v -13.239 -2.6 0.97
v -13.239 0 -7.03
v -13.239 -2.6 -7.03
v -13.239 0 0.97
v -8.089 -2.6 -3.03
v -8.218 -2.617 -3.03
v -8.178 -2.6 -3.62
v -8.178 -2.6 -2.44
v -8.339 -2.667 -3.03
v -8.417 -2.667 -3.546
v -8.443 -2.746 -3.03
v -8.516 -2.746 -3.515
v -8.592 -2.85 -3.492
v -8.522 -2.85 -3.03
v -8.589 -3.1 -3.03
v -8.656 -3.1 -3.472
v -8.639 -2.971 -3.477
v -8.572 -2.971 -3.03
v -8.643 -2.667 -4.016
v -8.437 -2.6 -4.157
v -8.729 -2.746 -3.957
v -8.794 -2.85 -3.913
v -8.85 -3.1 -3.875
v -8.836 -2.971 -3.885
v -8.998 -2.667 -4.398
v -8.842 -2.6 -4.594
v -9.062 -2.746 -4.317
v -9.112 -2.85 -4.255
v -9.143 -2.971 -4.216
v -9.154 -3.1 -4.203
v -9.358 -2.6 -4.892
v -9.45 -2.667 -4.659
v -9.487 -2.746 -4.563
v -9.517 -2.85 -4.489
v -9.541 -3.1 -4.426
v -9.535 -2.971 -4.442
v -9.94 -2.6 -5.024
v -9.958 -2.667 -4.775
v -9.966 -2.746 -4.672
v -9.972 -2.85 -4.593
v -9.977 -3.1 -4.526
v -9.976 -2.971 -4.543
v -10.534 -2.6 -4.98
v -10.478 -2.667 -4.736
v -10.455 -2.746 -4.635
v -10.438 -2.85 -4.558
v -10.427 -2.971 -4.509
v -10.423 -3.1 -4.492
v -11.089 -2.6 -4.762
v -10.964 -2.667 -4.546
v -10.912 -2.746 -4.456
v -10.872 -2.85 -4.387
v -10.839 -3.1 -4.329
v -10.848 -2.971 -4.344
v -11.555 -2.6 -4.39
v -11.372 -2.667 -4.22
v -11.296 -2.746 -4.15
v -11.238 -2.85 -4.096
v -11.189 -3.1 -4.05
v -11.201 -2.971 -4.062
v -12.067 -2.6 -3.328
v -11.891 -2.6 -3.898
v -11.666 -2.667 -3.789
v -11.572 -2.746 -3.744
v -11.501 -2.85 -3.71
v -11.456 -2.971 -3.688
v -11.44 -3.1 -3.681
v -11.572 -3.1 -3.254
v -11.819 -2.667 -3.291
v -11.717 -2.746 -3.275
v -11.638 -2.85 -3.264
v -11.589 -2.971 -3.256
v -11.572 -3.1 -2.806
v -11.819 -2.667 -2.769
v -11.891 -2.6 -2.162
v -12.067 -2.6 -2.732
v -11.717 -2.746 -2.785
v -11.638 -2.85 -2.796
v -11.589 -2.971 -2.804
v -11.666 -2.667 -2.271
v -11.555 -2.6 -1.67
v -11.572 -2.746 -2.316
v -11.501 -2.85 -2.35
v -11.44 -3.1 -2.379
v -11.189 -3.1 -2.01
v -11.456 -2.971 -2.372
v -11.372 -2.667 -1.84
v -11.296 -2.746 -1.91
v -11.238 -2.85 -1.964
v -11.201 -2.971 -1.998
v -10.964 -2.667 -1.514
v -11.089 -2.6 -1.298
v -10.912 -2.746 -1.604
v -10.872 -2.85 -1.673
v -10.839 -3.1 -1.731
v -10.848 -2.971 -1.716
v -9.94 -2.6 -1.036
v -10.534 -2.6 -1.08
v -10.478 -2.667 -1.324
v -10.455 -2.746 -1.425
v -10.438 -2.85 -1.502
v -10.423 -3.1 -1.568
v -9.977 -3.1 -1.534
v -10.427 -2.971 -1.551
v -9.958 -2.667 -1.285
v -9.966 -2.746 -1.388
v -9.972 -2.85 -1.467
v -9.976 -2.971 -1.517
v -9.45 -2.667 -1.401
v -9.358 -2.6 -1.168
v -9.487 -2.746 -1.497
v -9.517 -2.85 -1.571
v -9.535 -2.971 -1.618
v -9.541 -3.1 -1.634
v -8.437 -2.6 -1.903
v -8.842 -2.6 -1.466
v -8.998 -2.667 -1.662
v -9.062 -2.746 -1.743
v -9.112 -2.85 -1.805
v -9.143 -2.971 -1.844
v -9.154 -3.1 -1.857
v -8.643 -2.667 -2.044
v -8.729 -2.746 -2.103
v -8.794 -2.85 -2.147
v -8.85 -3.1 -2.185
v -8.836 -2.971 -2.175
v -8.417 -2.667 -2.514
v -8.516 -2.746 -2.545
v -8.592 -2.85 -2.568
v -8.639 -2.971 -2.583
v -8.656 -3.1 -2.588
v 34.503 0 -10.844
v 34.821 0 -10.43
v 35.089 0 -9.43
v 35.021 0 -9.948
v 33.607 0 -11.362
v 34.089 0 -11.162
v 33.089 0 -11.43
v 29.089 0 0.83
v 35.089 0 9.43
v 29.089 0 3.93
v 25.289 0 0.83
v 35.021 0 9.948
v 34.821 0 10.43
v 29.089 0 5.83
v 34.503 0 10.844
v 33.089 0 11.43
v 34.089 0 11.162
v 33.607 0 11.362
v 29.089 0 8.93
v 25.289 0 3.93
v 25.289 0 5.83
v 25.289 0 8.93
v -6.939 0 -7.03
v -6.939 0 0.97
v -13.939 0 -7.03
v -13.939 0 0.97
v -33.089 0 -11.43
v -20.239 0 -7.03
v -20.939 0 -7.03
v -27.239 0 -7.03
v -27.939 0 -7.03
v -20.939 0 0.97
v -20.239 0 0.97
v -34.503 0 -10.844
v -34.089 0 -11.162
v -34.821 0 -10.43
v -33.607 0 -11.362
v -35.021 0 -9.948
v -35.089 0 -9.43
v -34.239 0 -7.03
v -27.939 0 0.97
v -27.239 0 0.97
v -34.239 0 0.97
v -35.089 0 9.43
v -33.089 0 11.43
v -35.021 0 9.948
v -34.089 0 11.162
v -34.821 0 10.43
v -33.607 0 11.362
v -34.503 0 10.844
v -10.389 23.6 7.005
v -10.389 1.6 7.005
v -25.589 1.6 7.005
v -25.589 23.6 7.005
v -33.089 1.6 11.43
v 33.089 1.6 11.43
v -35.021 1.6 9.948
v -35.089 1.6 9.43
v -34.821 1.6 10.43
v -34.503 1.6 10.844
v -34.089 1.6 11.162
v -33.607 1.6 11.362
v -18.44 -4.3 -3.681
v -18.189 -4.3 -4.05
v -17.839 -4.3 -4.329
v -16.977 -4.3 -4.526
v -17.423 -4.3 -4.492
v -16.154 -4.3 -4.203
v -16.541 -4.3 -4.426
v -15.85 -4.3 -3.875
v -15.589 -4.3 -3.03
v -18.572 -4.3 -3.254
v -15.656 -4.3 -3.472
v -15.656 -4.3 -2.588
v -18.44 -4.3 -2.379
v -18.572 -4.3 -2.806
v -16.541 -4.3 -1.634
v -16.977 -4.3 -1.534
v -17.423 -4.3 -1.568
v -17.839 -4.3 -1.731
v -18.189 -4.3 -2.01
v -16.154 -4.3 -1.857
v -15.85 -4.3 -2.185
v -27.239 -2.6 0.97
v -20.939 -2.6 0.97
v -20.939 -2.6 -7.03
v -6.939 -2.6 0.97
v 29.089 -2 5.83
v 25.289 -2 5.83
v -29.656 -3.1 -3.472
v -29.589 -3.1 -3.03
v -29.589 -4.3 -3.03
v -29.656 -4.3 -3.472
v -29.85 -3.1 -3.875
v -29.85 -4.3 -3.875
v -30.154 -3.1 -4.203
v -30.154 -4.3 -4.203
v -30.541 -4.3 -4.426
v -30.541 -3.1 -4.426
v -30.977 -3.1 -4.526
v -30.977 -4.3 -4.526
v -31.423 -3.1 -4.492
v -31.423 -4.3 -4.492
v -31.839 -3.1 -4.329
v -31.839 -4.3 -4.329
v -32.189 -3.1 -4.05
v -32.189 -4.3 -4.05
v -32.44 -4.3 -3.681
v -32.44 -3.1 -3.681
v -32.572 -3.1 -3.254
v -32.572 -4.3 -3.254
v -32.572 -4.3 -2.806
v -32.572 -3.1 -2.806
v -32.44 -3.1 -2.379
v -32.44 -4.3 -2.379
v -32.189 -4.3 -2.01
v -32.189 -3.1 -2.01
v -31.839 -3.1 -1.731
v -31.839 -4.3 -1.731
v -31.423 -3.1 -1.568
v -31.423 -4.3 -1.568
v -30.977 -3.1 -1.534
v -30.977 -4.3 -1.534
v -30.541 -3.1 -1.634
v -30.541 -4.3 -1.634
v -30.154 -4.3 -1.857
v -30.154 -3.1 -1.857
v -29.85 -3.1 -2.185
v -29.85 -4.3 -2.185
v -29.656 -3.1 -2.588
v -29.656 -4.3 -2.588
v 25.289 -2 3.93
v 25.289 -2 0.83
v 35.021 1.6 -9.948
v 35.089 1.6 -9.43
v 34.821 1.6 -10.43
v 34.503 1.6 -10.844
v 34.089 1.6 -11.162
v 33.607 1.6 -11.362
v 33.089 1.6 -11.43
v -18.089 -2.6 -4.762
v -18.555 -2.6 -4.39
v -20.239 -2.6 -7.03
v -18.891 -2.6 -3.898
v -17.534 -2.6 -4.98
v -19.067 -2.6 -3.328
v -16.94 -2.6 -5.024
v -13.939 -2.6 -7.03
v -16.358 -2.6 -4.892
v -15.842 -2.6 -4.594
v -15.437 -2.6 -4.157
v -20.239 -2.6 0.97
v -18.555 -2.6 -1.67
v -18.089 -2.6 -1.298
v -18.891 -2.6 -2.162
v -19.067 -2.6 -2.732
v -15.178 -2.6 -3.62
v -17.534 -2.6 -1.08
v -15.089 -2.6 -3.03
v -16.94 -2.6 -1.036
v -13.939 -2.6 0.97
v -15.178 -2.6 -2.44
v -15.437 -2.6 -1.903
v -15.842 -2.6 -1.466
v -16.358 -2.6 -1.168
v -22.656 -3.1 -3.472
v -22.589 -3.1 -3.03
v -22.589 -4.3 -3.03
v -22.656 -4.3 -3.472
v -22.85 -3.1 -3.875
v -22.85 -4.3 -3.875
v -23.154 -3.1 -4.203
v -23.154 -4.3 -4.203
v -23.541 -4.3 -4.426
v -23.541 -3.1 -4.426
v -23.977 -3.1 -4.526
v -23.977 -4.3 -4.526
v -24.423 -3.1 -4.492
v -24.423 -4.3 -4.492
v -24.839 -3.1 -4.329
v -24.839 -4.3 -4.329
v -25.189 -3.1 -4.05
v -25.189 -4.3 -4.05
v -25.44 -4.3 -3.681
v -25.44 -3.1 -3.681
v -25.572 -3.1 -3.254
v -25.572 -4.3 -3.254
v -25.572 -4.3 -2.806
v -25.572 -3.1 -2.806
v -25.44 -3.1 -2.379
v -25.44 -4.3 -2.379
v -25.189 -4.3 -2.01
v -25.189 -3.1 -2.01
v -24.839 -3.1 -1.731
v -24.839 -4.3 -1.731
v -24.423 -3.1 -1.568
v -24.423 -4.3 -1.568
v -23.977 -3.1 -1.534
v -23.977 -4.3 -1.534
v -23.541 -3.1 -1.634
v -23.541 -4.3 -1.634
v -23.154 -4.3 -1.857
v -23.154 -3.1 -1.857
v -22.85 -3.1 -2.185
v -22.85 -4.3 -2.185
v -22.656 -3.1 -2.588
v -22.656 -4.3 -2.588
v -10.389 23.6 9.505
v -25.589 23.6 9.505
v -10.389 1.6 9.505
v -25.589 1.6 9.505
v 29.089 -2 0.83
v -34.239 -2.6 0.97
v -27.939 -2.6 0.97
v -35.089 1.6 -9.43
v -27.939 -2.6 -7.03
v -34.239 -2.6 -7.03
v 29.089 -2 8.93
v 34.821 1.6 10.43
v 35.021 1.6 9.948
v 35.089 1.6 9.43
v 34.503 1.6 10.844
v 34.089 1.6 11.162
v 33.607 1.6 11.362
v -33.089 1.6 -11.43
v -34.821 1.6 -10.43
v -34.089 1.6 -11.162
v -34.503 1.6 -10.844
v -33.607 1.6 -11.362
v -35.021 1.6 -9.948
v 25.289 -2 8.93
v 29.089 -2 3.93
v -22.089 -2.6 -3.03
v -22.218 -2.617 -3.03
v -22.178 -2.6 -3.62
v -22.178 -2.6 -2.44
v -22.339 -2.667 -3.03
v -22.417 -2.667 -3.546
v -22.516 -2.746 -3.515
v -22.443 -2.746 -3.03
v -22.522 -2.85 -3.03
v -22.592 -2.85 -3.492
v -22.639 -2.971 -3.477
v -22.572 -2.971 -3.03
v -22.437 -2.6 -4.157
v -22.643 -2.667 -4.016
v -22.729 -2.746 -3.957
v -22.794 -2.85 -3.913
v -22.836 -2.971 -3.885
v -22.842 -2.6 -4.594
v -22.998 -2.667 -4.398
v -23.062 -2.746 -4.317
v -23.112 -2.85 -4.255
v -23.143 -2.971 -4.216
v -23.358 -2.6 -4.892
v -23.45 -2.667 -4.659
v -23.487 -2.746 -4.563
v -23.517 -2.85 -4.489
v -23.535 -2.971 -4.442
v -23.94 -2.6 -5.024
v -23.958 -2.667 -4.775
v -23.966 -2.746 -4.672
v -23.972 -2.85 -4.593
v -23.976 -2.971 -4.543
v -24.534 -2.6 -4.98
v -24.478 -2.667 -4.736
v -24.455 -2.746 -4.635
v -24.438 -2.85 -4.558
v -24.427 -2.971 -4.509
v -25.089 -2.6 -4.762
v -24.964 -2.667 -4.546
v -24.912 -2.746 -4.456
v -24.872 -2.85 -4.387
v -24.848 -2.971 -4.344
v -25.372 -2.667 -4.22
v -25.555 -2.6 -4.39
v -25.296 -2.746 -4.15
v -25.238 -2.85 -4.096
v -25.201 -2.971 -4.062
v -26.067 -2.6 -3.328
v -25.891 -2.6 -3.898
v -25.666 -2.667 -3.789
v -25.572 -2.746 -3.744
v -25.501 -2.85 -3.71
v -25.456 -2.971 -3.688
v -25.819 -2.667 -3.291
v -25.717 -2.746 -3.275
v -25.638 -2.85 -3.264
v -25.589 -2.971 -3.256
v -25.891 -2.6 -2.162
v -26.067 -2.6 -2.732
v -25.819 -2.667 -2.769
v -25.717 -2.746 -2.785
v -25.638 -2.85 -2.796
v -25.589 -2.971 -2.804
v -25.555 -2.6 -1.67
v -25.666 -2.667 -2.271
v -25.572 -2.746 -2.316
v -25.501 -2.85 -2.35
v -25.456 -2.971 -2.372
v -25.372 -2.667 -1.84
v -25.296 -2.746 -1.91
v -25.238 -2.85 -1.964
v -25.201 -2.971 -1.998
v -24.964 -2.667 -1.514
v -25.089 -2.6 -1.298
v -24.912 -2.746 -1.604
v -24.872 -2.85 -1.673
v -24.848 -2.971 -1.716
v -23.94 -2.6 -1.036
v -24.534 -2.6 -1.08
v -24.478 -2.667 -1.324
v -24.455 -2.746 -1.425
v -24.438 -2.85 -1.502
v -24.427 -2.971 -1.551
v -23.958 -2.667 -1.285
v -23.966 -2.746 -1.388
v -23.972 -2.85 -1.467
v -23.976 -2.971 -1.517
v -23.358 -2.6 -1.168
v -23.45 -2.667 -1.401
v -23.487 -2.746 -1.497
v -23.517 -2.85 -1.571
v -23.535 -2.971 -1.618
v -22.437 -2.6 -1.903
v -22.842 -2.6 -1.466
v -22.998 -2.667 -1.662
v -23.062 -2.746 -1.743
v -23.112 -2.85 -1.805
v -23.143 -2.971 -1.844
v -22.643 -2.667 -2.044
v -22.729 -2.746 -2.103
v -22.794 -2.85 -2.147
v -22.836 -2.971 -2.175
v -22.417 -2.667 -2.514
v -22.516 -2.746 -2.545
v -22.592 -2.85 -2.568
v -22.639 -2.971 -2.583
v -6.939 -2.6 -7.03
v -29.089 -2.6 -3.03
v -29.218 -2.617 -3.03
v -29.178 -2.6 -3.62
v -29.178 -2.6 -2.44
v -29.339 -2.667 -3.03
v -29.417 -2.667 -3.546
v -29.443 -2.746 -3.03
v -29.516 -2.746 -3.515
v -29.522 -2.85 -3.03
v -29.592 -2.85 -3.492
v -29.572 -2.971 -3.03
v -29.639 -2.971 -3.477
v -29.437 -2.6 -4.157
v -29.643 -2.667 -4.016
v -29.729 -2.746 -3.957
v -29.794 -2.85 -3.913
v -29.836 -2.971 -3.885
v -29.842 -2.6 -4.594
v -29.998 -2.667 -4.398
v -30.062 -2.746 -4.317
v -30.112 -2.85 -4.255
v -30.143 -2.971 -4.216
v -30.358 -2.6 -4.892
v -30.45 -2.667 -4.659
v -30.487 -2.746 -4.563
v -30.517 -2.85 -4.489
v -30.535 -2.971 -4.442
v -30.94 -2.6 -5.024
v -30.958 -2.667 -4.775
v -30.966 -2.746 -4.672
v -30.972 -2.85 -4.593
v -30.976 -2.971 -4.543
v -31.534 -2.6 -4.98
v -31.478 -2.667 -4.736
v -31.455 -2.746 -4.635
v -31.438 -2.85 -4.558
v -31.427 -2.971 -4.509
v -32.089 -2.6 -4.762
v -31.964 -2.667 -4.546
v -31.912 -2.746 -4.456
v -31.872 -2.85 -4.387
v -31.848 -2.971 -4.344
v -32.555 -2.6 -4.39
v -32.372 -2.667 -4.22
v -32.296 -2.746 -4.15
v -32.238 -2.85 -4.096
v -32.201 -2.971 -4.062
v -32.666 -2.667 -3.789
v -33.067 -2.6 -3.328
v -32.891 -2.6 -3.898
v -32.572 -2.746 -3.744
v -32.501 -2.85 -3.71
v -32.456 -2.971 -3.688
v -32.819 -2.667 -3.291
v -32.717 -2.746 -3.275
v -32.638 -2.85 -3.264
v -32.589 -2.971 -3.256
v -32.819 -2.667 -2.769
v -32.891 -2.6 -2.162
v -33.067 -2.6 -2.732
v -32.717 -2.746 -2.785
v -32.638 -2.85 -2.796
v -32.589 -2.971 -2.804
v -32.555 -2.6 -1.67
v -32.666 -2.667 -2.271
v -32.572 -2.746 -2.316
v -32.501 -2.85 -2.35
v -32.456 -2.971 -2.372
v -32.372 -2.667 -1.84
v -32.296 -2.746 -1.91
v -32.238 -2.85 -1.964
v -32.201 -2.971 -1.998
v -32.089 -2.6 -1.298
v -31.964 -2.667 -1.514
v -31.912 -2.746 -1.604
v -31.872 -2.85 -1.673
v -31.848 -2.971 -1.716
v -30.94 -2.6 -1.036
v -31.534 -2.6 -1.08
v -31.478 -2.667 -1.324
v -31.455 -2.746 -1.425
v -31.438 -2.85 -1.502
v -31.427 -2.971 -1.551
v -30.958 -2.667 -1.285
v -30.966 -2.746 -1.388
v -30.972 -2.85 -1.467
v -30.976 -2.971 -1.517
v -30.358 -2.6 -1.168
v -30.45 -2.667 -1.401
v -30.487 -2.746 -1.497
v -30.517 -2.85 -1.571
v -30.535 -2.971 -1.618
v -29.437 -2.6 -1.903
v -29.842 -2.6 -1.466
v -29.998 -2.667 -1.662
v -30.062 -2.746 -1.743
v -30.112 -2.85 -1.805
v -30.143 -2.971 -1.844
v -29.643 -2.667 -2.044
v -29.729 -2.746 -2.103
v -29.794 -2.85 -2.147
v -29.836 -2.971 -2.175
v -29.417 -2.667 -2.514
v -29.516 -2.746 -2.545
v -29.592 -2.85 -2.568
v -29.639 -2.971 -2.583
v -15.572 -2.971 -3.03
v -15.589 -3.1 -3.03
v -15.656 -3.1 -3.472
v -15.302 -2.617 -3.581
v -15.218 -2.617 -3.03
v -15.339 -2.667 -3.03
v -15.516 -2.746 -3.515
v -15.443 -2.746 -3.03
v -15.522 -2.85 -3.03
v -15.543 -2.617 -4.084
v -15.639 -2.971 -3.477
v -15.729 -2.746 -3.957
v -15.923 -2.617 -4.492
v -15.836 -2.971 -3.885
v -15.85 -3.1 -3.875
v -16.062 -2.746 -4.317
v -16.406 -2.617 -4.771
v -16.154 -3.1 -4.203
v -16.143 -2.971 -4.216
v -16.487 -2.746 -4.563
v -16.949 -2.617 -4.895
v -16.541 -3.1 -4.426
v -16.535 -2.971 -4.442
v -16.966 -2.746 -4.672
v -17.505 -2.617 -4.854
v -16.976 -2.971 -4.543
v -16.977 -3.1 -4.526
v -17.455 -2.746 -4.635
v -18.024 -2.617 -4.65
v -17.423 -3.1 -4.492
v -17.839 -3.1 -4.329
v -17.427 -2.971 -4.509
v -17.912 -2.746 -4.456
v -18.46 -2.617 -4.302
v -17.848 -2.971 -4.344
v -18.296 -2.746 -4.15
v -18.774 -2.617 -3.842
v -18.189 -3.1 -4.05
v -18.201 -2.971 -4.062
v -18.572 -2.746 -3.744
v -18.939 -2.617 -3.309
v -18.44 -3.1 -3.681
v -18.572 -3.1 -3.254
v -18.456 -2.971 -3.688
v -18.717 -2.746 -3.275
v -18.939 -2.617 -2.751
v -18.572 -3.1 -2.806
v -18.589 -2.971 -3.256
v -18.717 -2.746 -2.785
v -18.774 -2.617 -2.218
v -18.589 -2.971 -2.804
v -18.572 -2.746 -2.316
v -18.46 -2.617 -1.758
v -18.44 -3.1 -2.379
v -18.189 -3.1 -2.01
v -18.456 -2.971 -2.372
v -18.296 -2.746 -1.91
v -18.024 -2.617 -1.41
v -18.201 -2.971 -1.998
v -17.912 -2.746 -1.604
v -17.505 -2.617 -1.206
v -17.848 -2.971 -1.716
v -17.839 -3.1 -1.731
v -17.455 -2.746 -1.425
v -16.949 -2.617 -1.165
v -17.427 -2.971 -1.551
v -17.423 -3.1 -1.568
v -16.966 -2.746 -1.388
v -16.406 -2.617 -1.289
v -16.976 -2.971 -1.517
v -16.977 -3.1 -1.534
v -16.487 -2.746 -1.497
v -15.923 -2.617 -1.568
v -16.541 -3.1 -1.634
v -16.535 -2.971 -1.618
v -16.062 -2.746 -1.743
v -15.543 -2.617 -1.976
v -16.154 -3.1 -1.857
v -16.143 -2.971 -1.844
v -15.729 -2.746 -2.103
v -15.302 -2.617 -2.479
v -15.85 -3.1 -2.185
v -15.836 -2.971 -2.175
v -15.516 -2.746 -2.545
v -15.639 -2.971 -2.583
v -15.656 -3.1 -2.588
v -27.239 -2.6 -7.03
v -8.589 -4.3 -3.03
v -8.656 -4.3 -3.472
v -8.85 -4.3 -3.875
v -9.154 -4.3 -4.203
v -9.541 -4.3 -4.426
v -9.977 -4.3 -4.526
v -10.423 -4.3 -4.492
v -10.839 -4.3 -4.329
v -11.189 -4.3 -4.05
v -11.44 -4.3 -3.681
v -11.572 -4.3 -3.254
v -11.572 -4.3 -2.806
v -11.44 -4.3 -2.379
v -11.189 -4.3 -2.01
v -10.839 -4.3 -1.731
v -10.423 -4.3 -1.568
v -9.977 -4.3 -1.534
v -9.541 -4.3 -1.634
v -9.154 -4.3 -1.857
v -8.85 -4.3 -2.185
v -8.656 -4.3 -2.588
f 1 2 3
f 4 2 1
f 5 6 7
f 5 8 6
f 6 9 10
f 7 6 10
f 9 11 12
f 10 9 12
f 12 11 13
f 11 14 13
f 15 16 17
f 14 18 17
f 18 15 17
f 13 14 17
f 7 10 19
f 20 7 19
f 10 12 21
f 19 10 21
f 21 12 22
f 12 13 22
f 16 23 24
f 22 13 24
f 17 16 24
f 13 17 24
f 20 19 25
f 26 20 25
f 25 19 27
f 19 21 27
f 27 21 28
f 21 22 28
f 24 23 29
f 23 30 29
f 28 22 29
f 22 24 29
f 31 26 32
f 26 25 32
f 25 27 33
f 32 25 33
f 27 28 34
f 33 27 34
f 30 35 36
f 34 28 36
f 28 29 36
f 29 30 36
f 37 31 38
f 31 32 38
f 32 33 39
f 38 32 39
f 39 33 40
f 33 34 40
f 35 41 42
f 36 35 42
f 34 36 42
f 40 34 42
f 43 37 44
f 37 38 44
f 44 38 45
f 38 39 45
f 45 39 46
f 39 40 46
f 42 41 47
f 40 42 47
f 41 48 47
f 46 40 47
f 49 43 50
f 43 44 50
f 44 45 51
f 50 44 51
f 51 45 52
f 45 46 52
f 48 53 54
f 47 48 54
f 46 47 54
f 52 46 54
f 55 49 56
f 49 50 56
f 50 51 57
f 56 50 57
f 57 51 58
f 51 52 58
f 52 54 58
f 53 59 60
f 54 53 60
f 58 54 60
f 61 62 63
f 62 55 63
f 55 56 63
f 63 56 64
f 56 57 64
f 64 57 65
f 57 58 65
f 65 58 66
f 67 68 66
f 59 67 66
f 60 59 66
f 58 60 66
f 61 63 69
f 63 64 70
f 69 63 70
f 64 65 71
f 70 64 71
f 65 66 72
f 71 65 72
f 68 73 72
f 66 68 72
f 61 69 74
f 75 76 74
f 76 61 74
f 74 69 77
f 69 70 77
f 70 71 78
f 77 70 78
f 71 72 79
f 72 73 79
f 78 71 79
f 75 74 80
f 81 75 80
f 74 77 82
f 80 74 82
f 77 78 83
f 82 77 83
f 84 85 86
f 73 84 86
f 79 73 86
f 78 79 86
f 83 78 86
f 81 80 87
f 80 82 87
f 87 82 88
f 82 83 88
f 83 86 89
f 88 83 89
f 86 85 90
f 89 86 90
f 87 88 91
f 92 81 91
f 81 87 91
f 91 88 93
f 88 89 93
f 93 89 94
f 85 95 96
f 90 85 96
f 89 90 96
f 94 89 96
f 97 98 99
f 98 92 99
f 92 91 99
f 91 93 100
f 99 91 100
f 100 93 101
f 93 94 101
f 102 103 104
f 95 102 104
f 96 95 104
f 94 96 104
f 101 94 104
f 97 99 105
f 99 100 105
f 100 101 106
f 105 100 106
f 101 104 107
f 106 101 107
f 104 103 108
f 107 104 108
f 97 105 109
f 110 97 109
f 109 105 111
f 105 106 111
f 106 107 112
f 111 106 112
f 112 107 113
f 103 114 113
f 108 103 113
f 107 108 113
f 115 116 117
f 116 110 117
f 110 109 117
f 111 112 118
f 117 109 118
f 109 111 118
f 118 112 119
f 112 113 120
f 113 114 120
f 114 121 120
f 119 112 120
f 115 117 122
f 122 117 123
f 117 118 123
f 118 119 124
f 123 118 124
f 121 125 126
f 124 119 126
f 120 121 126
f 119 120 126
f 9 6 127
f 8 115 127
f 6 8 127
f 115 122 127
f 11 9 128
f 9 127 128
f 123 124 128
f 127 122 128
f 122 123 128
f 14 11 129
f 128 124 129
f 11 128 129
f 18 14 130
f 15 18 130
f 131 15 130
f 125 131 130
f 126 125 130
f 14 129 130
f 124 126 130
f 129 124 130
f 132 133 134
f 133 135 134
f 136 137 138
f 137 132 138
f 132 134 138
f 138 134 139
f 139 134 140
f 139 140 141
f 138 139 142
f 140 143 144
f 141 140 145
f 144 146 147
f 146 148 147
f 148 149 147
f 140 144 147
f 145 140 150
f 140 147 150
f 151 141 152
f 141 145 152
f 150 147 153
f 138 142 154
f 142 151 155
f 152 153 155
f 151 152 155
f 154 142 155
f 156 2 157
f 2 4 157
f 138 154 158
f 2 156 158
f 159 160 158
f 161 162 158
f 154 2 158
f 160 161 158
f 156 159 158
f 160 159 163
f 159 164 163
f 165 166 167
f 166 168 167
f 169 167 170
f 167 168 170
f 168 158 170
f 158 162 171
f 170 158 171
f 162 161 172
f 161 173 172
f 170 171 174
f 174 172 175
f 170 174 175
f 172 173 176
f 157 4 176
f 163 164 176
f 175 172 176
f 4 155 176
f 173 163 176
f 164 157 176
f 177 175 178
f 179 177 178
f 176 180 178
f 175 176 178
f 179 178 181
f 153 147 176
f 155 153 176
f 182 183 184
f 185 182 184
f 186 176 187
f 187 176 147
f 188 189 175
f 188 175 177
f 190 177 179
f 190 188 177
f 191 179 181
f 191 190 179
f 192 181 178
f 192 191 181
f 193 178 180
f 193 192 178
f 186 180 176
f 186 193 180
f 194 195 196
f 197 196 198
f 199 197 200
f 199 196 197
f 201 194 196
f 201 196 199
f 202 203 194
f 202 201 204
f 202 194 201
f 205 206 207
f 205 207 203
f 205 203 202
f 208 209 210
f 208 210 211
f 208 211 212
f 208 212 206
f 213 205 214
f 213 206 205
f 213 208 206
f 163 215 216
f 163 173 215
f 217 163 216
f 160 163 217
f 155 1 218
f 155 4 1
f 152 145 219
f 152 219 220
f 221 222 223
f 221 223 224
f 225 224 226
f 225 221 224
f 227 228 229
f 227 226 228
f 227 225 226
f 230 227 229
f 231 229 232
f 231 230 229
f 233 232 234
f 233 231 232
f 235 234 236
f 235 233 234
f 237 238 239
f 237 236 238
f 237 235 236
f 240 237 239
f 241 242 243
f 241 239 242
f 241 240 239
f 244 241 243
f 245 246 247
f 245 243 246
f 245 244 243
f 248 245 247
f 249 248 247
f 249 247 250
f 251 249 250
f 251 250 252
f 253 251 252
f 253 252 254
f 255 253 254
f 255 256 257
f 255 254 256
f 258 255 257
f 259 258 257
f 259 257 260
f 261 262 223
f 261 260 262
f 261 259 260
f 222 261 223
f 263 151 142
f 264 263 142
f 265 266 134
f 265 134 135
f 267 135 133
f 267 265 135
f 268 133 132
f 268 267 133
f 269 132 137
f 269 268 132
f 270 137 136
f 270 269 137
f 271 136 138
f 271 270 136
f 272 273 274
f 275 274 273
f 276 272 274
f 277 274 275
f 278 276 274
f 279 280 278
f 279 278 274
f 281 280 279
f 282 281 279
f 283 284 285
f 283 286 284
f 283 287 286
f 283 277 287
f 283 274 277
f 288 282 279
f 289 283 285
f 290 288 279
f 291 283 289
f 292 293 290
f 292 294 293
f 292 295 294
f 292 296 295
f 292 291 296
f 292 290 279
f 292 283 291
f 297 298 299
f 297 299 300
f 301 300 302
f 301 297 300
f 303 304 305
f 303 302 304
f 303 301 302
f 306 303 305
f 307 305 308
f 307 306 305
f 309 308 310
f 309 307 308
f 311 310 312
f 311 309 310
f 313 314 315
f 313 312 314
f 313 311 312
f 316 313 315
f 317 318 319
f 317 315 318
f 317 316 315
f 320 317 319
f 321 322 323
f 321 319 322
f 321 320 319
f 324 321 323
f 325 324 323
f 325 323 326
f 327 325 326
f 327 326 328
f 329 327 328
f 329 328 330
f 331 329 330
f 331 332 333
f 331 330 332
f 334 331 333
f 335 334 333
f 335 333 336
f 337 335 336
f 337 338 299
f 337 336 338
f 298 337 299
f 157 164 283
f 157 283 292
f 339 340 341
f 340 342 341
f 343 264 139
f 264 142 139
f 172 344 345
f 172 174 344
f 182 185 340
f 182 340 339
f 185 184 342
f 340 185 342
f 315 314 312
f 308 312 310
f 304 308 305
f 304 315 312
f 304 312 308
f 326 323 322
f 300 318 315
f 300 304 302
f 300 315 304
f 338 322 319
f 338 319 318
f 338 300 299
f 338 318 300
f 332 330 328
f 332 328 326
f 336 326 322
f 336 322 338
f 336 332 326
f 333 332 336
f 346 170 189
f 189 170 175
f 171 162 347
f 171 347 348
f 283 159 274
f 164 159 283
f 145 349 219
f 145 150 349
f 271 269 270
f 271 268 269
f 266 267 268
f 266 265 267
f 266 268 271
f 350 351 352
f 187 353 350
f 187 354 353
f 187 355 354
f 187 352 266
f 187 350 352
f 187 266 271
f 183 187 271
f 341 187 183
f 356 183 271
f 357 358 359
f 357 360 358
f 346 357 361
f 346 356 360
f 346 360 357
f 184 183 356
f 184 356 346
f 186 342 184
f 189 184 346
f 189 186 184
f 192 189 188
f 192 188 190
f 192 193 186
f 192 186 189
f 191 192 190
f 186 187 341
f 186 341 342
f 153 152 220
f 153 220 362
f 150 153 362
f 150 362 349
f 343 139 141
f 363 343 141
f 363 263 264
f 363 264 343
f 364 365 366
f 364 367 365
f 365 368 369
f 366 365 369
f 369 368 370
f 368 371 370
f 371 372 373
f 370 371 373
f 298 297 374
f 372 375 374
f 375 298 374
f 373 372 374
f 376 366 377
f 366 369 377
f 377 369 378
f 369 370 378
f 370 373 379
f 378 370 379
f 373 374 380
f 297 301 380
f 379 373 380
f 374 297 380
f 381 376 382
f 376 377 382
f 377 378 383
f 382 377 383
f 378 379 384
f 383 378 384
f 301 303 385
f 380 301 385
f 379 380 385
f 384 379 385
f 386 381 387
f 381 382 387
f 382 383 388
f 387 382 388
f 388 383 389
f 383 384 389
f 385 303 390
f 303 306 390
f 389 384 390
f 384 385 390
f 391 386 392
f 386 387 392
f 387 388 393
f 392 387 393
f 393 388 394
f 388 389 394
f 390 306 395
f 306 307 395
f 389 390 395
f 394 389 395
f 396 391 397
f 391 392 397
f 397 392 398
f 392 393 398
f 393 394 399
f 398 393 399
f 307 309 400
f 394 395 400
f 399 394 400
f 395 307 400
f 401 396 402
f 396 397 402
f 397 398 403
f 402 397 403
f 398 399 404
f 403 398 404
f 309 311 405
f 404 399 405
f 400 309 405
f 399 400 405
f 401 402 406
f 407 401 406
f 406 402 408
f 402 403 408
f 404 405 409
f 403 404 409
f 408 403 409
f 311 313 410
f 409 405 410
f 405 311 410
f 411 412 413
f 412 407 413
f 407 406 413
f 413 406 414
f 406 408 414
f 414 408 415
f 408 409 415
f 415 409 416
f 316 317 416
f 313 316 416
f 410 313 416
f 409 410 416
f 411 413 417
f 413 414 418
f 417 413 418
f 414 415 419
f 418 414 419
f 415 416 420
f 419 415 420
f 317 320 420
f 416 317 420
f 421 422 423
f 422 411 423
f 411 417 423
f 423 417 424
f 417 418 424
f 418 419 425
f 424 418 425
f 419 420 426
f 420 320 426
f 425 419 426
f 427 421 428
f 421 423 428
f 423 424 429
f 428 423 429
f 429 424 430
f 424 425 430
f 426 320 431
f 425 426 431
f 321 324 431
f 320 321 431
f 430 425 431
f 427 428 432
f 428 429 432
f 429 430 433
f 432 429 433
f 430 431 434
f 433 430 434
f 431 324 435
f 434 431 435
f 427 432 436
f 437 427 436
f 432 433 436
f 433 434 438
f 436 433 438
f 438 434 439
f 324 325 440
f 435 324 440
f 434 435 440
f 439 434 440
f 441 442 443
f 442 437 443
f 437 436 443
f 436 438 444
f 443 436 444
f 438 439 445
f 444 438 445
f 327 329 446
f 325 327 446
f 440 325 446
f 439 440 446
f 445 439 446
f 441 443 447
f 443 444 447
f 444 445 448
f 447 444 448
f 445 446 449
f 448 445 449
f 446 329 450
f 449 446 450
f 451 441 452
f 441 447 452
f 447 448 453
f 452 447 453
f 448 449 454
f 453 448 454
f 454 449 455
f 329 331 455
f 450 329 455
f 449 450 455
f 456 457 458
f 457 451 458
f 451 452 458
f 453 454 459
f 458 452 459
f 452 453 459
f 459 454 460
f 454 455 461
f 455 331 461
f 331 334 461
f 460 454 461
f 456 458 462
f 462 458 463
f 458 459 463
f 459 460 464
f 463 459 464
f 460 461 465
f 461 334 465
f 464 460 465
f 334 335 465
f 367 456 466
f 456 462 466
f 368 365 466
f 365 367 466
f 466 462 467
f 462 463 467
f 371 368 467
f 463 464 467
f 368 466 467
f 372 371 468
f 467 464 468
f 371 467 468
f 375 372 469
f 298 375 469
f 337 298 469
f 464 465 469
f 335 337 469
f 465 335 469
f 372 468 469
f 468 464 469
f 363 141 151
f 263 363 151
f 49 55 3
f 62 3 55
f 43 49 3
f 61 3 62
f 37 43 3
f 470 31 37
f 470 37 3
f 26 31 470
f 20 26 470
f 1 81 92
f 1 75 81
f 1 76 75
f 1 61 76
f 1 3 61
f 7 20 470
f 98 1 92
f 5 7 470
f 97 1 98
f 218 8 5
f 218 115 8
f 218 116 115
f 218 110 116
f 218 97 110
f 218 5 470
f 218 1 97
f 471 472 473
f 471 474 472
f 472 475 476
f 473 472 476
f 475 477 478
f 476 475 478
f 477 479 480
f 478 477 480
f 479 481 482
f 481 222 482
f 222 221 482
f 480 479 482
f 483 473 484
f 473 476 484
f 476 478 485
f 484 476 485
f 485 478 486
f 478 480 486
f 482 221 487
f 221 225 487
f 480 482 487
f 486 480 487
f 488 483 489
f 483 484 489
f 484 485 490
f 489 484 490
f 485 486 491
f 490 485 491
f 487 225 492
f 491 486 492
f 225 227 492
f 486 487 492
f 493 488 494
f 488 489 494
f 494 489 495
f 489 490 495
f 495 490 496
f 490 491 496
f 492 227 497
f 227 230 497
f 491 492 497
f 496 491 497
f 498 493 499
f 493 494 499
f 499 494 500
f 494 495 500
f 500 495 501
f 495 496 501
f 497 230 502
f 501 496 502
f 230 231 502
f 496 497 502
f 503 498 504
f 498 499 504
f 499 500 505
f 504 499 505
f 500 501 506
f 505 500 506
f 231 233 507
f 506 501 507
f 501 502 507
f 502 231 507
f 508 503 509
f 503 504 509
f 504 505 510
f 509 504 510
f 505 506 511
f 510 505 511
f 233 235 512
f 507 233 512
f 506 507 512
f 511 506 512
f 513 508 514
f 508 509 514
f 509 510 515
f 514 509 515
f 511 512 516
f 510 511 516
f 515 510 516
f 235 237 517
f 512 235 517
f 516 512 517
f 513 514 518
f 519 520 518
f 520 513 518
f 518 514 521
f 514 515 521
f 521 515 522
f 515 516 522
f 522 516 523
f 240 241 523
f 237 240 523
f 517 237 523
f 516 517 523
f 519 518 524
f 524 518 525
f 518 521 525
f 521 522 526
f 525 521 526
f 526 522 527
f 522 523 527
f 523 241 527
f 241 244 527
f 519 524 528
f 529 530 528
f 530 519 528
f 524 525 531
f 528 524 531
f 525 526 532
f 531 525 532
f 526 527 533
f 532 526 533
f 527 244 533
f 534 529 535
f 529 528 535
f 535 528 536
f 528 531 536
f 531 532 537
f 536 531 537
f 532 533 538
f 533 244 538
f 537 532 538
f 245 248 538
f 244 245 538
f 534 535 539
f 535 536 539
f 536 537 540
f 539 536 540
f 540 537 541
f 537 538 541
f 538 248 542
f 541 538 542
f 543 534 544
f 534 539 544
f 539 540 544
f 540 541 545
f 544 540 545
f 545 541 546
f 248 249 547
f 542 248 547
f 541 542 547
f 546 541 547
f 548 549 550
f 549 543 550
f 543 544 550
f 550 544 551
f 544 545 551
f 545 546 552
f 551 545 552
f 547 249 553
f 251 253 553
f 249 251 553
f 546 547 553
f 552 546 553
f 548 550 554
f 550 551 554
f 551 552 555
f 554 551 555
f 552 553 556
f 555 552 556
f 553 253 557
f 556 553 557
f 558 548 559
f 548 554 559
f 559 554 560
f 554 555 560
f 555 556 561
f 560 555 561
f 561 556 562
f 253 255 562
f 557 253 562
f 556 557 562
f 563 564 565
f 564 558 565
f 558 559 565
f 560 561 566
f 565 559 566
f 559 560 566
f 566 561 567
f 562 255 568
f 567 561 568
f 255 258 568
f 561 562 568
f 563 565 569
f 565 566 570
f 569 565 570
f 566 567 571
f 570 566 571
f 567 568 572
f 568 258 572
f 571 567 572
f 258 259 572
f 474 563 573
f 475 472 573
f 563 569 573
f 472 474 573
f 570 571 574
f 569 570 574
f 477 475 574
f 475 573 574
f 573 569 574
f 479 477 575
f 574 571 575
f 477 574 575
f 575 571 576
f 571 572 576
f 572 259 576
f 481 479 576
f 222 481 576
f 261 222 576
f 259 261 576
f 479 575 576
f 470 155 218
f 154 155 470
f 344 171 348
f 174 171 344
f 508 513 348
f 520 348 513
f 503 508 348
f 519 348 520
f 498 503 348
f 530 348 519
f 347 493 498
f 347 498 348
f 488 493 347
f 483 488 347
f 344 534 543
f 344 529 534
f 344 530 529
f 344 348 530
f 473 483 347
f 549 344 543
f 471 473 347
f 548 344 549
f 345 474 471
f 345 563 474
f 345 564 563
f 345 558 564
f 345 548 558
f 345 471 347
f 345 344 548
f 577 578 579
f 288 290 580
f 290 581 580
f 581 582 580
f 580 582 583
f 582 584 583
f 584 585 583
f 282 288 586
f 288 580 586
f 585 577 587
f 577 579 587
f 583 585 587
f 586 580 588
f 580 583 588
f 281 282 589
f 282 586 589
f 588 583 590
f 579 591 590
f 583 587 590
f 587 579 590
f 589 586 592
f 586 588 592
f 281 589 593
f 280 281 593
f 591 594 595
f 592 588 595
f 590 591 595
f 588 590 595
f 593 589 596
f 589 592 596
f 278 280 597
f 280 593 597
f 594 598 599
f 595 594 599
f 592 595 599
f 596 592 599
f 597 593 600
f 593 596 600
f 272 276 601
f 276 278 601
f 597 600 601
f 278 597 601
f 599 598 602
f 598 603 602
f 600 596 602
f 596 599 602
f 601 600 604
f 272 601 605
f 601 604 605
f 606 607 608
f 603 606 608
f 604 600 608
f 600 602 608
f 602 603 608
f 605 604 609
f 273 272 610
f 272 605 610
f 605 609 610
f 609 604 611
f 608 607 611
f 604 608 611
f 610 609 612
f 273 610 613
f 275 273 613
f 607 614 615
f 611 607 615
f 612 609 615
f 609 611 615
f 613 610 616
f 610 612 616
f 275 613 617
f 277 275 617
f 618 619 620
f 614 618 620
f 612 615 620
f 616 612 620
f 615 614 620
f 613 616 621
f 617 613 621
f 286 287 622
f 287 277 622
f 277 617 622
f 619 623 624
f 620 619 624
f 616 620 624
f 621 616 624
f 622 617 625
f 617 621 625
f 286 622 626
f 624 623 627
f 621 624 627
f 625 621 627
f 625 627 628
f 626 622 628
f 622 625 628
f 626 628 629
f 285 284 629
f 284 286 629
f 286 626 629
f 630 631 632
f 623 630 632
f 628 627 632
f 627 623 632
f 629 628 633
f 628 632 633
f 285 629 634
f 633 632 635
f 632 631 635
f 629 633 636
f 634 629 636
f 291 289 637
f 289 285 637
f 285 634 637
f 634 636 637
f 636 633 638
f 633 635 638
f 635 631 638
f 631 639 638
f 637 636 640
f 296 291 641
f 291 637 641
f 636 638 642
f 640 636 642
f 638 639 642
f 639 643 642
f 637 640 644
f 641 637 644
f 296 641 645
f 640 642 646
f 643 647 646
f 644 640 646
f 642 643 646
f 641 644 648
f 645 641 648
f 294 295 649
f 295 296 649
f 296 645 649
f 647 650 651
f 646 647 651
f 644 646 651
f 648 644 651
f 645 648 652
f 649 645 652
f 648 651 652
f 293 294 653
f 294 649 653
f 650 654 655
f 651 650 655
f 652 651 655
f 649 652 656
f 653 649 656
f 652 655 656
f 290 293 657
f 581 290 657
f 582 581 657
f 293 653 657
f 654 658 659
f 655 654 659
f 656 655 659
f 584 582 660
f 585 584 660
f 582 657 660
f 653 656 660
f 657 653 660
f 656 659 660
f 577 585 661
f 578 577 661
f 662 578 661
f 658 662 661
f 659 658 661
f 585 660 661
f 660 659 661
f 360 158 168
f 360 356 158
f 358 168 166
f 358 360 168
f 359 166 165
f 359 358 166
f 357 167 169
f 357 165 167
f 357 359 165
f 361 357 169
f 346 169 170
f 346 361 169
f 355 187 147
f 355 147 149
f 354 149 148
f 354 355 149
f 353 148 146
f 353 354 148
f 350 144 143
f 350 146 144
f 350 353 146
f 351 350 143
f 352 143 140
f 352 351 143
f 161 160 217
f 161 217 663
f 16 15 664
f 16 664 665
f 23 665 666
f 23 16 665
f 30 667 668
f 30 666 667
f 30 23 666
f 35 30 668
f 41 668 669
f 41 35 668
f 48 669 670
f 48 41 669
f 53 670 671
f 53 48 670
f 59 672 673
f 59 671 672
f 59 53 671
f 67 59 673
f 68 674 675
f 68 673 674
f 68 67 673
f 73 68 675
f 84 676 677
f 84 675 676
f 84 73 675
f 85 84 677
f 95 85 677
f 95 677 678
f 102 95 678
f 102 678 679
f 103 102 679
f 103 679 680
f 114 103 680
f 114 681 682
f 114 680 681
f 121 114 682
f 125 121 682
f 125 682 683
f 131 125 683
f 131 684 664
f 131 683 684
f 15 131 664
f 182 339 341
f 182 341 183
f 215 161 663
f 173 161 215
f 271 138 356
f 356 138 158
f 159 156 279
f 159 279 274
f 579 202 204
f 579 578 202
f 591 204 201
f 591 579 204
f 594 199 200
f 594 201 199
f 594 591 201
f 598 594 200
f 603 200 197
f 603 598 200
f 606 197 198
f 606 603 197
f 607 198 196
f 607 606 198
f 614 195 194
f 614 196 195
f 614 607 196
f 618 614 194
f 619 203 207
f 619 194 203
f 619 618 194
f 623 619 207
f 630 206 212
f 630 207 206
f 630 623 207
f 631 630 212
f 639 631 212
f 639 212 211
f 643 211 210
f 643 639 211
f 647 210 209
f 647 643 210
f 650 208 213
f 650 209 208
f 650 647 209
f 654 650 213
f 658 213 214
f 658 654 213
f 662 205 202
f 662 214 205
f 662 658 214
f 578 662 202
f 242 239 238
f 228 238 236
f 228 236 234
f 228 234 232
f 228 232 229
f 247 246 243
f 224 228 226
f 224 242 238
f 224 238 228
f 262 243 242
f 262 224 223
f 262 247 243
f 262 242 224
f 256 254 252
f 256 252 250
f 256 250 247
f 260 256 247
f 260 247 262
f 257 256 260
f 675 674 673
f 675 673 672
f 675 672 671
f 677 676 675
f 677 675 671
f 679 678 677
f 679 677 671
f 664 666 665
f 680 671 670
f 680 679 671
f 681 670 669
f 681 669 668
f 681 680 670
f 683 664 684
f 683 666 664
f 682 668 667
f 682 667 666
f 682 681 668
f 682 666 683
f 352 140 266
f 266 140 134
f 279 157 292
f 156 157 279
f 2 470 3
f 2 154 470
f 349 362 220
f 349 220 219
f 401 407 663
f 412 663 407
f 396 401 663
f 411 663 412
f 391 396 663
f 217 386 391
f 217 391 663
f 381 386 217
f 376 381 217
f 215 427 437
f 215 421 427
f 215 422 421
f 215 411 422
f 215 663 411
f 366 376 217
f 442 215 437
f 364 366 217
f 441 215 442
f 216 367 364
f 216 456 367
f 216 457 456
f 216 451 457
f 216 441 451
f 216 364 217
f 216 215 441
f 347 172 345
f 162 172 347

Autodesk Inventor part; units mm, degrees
ref_plane "YZ Plane" through (0, 0, 0) normal (1, 0, 0) x (0, 1, 0)
ref_plane "XZ Plane" through (0, 0, 0) normal (0, 1, 0) x (-1, 0, 0)
ref_plane "XY Plane" through (0, 0, 0) normal (0, 0, 1) x (1, 0, 0)
sketch "Sketch1" plane through (0, 0, 0) normal (0, 1, 0) x (-1, 0, 0)
  line L0 (35.089, 11.43) -> (-35.089, 11.43)
  line L1 (-35.089, 11.43) -> (-35.089, -11.43)
  line L2 (-35.089, -11.43) -> (35.089, -11.43)
  line L3 (35.089, -11.43) -> (35.089, 11.43)
  line L4 (35.089, 11.43) -> (-35.089, -11.43) construction
  line L5 (-35.089, 11.43) -> (35.089, -11.43) construction
  point P0 (0, 0)
  dimension "d0" = 70.178
  dimension "d1" = 22.86
extrude "Extrusion1" add sketch "Sketch1" along normal blind 1.6
fillet "Fillet1" radius 2 4 edges at (-35.089, 0.8, -11.43) (-35.089, 0.8, 11.43) (35.089, 0.8, 11.43) (35.089, 0.8, -11.43)
sketch "Sketch7" plane through (0, 0, 0) normal (0, -1, 0) x (1, 0, 0)
  line L0 (-34.239, 0.97) -> (-27.939, 0.97)
  line L1 (-27.939, 0.97) -> (-27.939, -7.03)
  line L2 (-27.939, -7.03) -> (-34.239, -7.03)
  line L3 (-34.239, -7.03) -> (-34.239, 0.97)
  line L4 (-27.239, 0.97) -> (-20.939, 0.97)
  line L5 (-20.939, 0.97) -> (-20.939, -7.03)
  line L6 (-20.939, -7.03) -> (-27.239, -7.03)
  line L7 (-27.239, -7.03) -> (-27.239, 0.97)
  line L8 (-20.239, 0.97) -> (-13.939, 0.97)
  line L9 (-13.939, 0.97) -> (-13.939, -7.03)
  line L10 (-13.939, -7.03) -> (-20.239, -7.03)
  line L11 (-20.239, -7.03) -> (-20.239, 0.97)
  line L12 (-13.239, 0.97) -> (-6.939, 0.97)
  line L13 (-6.939, 0.97) -> (-6.939, -7.03)
  line L14 (-6.939, -7.03) -> (-13.239, -7.03)
  line L15 (-13.239, -7.03) -> (-13.239, 0.97)
  line L16 (33.089, -11.43) -> (-33.089, -11.43) projected
  line L17 (-35.089, -9.43) -> (-35.089, 9.43) projected
  point P0 (0, 0)
  point P1 (-31.089, 0.97)
  point P2 (-24.089, 0.97)
  point P3 (-17.089, 0.97)
  point P4 (-10.089, 0.97)
  point P5 (-34.239, -3.03)
  dimension "d48" = 8
  dimension "d49" = 6.3
  dimension "d50" = 6.3
  dimension "d51" = 6.3
  dimension "d52" = 6.3
  dimension "d53" = 7
  dimension "d54" = 7
  dimension "d55" = 7
  dimension "d56" = 8.4
  dimension "d85" = 4
extrude "Extrusion6" add sketch "Sketch7" along normal blind 2.6
sketch "Sketch8" plane through (0, -2.6, 0) normal (0, -1, 0) x (1, 0, 0)
  circle A0 centre (-31.089, -3.03) radius 1.5
  line L0 (-27.939, 0.97) -> (-34.239, 0.97) projected
  line L1 (-34.239, 0.97) -> (-34.239, -7.03) projected
  circle A1 centre (-24.089, -3.03) radius 1.5
  circle A2 centre (-17.089, -3.03) radius 1.5
  circle A3 centre (-10.089, -3.03) radius 1.5
  point P0 (0, 0)
  point P1 (-31.089, 0.97)
  point P2 (-34.239, -3.03)
  dimension "d60" = 3
  dimension "d63" = 7
extrude "Extrusion7" add sketch "Sketch8" along normal blind 1.7
fillet "Fillet2" radius 0.5 4 edges at (-32.589, -2.6, -3.03) (-25.589, -2.6, -3.03) (-18.589, -2.6, -3.03) (-11.589, -2.6, -3.03)
sketch "Sketch9" plane through (0, 0, 0) normal (0, -1, 0) x (1, 0, 0)
  line L0 (25.289, 8.93) -> (29.089, 8.93)
  line L1 (29.089, 8.93) -> (29.089, 5.83)
  line L2 (29.089, 5.83) -> (25.289, 5.83)
  line L3 (25.289, 5.83) -> (25.289, 8.93)
  line L4 (25.289, 0.83) -> (29.089, 0.83)
  line L5 (29.089, 0.83) -> (29.089, 3.93)
  line L6 (29.089, 3.93) -> (25.289, 3.93)
  line L7 (25.289, 3.93) -> (25.289, 0.83)
  line L8 (-33.089, 11.43) -> (33.089, 11.43) projected
  line L9 (35.089, 9.43) -> (35.089, -9.43) projected
  point P0 (0, 0)
  dimension "d71" = 3.8
  dimension "d72" = 3.1
  dimension "d73" = 3.1
  dimension "d74" = 1.9
  dimension "d75" = 2.5
  dimension "d76" = 6
extrude "Extrusion8" add sketch "Sketch9" along normal blind 2
sketch "Sketch10" plane through (0, 1.6, 0) normal (0, 1, 0) x (1, 0, 0)
  line L0 (-25.589, -9.505) -> (-10.389, -9.505)
  line L1 (-10.389, -9.505) -> (-10.389, -7.005)
  line L2 (-10.389, -7.005) -> (-25.589, -7.005)
  line L3 (-25.589, -7.005) -> (-25.589, -9.505)
  line L4 (-33.089, -11.43) -> (33.089, -11.43) projected
  line L5 (-35.089, 9.43) -> (-35.089, -9.43) projected
  point P0 (0, 0)
  point P1 (-25.589, -8.255)
  dimension "d79" = 3.175
  dimension "d80" = 2.5
  dimension "d81" = 15.2
  dimension "d82" = 9.5
extrude "Extrusion9" add sketch "Sketch10" along normal blind 22
properties part number "Platine"
